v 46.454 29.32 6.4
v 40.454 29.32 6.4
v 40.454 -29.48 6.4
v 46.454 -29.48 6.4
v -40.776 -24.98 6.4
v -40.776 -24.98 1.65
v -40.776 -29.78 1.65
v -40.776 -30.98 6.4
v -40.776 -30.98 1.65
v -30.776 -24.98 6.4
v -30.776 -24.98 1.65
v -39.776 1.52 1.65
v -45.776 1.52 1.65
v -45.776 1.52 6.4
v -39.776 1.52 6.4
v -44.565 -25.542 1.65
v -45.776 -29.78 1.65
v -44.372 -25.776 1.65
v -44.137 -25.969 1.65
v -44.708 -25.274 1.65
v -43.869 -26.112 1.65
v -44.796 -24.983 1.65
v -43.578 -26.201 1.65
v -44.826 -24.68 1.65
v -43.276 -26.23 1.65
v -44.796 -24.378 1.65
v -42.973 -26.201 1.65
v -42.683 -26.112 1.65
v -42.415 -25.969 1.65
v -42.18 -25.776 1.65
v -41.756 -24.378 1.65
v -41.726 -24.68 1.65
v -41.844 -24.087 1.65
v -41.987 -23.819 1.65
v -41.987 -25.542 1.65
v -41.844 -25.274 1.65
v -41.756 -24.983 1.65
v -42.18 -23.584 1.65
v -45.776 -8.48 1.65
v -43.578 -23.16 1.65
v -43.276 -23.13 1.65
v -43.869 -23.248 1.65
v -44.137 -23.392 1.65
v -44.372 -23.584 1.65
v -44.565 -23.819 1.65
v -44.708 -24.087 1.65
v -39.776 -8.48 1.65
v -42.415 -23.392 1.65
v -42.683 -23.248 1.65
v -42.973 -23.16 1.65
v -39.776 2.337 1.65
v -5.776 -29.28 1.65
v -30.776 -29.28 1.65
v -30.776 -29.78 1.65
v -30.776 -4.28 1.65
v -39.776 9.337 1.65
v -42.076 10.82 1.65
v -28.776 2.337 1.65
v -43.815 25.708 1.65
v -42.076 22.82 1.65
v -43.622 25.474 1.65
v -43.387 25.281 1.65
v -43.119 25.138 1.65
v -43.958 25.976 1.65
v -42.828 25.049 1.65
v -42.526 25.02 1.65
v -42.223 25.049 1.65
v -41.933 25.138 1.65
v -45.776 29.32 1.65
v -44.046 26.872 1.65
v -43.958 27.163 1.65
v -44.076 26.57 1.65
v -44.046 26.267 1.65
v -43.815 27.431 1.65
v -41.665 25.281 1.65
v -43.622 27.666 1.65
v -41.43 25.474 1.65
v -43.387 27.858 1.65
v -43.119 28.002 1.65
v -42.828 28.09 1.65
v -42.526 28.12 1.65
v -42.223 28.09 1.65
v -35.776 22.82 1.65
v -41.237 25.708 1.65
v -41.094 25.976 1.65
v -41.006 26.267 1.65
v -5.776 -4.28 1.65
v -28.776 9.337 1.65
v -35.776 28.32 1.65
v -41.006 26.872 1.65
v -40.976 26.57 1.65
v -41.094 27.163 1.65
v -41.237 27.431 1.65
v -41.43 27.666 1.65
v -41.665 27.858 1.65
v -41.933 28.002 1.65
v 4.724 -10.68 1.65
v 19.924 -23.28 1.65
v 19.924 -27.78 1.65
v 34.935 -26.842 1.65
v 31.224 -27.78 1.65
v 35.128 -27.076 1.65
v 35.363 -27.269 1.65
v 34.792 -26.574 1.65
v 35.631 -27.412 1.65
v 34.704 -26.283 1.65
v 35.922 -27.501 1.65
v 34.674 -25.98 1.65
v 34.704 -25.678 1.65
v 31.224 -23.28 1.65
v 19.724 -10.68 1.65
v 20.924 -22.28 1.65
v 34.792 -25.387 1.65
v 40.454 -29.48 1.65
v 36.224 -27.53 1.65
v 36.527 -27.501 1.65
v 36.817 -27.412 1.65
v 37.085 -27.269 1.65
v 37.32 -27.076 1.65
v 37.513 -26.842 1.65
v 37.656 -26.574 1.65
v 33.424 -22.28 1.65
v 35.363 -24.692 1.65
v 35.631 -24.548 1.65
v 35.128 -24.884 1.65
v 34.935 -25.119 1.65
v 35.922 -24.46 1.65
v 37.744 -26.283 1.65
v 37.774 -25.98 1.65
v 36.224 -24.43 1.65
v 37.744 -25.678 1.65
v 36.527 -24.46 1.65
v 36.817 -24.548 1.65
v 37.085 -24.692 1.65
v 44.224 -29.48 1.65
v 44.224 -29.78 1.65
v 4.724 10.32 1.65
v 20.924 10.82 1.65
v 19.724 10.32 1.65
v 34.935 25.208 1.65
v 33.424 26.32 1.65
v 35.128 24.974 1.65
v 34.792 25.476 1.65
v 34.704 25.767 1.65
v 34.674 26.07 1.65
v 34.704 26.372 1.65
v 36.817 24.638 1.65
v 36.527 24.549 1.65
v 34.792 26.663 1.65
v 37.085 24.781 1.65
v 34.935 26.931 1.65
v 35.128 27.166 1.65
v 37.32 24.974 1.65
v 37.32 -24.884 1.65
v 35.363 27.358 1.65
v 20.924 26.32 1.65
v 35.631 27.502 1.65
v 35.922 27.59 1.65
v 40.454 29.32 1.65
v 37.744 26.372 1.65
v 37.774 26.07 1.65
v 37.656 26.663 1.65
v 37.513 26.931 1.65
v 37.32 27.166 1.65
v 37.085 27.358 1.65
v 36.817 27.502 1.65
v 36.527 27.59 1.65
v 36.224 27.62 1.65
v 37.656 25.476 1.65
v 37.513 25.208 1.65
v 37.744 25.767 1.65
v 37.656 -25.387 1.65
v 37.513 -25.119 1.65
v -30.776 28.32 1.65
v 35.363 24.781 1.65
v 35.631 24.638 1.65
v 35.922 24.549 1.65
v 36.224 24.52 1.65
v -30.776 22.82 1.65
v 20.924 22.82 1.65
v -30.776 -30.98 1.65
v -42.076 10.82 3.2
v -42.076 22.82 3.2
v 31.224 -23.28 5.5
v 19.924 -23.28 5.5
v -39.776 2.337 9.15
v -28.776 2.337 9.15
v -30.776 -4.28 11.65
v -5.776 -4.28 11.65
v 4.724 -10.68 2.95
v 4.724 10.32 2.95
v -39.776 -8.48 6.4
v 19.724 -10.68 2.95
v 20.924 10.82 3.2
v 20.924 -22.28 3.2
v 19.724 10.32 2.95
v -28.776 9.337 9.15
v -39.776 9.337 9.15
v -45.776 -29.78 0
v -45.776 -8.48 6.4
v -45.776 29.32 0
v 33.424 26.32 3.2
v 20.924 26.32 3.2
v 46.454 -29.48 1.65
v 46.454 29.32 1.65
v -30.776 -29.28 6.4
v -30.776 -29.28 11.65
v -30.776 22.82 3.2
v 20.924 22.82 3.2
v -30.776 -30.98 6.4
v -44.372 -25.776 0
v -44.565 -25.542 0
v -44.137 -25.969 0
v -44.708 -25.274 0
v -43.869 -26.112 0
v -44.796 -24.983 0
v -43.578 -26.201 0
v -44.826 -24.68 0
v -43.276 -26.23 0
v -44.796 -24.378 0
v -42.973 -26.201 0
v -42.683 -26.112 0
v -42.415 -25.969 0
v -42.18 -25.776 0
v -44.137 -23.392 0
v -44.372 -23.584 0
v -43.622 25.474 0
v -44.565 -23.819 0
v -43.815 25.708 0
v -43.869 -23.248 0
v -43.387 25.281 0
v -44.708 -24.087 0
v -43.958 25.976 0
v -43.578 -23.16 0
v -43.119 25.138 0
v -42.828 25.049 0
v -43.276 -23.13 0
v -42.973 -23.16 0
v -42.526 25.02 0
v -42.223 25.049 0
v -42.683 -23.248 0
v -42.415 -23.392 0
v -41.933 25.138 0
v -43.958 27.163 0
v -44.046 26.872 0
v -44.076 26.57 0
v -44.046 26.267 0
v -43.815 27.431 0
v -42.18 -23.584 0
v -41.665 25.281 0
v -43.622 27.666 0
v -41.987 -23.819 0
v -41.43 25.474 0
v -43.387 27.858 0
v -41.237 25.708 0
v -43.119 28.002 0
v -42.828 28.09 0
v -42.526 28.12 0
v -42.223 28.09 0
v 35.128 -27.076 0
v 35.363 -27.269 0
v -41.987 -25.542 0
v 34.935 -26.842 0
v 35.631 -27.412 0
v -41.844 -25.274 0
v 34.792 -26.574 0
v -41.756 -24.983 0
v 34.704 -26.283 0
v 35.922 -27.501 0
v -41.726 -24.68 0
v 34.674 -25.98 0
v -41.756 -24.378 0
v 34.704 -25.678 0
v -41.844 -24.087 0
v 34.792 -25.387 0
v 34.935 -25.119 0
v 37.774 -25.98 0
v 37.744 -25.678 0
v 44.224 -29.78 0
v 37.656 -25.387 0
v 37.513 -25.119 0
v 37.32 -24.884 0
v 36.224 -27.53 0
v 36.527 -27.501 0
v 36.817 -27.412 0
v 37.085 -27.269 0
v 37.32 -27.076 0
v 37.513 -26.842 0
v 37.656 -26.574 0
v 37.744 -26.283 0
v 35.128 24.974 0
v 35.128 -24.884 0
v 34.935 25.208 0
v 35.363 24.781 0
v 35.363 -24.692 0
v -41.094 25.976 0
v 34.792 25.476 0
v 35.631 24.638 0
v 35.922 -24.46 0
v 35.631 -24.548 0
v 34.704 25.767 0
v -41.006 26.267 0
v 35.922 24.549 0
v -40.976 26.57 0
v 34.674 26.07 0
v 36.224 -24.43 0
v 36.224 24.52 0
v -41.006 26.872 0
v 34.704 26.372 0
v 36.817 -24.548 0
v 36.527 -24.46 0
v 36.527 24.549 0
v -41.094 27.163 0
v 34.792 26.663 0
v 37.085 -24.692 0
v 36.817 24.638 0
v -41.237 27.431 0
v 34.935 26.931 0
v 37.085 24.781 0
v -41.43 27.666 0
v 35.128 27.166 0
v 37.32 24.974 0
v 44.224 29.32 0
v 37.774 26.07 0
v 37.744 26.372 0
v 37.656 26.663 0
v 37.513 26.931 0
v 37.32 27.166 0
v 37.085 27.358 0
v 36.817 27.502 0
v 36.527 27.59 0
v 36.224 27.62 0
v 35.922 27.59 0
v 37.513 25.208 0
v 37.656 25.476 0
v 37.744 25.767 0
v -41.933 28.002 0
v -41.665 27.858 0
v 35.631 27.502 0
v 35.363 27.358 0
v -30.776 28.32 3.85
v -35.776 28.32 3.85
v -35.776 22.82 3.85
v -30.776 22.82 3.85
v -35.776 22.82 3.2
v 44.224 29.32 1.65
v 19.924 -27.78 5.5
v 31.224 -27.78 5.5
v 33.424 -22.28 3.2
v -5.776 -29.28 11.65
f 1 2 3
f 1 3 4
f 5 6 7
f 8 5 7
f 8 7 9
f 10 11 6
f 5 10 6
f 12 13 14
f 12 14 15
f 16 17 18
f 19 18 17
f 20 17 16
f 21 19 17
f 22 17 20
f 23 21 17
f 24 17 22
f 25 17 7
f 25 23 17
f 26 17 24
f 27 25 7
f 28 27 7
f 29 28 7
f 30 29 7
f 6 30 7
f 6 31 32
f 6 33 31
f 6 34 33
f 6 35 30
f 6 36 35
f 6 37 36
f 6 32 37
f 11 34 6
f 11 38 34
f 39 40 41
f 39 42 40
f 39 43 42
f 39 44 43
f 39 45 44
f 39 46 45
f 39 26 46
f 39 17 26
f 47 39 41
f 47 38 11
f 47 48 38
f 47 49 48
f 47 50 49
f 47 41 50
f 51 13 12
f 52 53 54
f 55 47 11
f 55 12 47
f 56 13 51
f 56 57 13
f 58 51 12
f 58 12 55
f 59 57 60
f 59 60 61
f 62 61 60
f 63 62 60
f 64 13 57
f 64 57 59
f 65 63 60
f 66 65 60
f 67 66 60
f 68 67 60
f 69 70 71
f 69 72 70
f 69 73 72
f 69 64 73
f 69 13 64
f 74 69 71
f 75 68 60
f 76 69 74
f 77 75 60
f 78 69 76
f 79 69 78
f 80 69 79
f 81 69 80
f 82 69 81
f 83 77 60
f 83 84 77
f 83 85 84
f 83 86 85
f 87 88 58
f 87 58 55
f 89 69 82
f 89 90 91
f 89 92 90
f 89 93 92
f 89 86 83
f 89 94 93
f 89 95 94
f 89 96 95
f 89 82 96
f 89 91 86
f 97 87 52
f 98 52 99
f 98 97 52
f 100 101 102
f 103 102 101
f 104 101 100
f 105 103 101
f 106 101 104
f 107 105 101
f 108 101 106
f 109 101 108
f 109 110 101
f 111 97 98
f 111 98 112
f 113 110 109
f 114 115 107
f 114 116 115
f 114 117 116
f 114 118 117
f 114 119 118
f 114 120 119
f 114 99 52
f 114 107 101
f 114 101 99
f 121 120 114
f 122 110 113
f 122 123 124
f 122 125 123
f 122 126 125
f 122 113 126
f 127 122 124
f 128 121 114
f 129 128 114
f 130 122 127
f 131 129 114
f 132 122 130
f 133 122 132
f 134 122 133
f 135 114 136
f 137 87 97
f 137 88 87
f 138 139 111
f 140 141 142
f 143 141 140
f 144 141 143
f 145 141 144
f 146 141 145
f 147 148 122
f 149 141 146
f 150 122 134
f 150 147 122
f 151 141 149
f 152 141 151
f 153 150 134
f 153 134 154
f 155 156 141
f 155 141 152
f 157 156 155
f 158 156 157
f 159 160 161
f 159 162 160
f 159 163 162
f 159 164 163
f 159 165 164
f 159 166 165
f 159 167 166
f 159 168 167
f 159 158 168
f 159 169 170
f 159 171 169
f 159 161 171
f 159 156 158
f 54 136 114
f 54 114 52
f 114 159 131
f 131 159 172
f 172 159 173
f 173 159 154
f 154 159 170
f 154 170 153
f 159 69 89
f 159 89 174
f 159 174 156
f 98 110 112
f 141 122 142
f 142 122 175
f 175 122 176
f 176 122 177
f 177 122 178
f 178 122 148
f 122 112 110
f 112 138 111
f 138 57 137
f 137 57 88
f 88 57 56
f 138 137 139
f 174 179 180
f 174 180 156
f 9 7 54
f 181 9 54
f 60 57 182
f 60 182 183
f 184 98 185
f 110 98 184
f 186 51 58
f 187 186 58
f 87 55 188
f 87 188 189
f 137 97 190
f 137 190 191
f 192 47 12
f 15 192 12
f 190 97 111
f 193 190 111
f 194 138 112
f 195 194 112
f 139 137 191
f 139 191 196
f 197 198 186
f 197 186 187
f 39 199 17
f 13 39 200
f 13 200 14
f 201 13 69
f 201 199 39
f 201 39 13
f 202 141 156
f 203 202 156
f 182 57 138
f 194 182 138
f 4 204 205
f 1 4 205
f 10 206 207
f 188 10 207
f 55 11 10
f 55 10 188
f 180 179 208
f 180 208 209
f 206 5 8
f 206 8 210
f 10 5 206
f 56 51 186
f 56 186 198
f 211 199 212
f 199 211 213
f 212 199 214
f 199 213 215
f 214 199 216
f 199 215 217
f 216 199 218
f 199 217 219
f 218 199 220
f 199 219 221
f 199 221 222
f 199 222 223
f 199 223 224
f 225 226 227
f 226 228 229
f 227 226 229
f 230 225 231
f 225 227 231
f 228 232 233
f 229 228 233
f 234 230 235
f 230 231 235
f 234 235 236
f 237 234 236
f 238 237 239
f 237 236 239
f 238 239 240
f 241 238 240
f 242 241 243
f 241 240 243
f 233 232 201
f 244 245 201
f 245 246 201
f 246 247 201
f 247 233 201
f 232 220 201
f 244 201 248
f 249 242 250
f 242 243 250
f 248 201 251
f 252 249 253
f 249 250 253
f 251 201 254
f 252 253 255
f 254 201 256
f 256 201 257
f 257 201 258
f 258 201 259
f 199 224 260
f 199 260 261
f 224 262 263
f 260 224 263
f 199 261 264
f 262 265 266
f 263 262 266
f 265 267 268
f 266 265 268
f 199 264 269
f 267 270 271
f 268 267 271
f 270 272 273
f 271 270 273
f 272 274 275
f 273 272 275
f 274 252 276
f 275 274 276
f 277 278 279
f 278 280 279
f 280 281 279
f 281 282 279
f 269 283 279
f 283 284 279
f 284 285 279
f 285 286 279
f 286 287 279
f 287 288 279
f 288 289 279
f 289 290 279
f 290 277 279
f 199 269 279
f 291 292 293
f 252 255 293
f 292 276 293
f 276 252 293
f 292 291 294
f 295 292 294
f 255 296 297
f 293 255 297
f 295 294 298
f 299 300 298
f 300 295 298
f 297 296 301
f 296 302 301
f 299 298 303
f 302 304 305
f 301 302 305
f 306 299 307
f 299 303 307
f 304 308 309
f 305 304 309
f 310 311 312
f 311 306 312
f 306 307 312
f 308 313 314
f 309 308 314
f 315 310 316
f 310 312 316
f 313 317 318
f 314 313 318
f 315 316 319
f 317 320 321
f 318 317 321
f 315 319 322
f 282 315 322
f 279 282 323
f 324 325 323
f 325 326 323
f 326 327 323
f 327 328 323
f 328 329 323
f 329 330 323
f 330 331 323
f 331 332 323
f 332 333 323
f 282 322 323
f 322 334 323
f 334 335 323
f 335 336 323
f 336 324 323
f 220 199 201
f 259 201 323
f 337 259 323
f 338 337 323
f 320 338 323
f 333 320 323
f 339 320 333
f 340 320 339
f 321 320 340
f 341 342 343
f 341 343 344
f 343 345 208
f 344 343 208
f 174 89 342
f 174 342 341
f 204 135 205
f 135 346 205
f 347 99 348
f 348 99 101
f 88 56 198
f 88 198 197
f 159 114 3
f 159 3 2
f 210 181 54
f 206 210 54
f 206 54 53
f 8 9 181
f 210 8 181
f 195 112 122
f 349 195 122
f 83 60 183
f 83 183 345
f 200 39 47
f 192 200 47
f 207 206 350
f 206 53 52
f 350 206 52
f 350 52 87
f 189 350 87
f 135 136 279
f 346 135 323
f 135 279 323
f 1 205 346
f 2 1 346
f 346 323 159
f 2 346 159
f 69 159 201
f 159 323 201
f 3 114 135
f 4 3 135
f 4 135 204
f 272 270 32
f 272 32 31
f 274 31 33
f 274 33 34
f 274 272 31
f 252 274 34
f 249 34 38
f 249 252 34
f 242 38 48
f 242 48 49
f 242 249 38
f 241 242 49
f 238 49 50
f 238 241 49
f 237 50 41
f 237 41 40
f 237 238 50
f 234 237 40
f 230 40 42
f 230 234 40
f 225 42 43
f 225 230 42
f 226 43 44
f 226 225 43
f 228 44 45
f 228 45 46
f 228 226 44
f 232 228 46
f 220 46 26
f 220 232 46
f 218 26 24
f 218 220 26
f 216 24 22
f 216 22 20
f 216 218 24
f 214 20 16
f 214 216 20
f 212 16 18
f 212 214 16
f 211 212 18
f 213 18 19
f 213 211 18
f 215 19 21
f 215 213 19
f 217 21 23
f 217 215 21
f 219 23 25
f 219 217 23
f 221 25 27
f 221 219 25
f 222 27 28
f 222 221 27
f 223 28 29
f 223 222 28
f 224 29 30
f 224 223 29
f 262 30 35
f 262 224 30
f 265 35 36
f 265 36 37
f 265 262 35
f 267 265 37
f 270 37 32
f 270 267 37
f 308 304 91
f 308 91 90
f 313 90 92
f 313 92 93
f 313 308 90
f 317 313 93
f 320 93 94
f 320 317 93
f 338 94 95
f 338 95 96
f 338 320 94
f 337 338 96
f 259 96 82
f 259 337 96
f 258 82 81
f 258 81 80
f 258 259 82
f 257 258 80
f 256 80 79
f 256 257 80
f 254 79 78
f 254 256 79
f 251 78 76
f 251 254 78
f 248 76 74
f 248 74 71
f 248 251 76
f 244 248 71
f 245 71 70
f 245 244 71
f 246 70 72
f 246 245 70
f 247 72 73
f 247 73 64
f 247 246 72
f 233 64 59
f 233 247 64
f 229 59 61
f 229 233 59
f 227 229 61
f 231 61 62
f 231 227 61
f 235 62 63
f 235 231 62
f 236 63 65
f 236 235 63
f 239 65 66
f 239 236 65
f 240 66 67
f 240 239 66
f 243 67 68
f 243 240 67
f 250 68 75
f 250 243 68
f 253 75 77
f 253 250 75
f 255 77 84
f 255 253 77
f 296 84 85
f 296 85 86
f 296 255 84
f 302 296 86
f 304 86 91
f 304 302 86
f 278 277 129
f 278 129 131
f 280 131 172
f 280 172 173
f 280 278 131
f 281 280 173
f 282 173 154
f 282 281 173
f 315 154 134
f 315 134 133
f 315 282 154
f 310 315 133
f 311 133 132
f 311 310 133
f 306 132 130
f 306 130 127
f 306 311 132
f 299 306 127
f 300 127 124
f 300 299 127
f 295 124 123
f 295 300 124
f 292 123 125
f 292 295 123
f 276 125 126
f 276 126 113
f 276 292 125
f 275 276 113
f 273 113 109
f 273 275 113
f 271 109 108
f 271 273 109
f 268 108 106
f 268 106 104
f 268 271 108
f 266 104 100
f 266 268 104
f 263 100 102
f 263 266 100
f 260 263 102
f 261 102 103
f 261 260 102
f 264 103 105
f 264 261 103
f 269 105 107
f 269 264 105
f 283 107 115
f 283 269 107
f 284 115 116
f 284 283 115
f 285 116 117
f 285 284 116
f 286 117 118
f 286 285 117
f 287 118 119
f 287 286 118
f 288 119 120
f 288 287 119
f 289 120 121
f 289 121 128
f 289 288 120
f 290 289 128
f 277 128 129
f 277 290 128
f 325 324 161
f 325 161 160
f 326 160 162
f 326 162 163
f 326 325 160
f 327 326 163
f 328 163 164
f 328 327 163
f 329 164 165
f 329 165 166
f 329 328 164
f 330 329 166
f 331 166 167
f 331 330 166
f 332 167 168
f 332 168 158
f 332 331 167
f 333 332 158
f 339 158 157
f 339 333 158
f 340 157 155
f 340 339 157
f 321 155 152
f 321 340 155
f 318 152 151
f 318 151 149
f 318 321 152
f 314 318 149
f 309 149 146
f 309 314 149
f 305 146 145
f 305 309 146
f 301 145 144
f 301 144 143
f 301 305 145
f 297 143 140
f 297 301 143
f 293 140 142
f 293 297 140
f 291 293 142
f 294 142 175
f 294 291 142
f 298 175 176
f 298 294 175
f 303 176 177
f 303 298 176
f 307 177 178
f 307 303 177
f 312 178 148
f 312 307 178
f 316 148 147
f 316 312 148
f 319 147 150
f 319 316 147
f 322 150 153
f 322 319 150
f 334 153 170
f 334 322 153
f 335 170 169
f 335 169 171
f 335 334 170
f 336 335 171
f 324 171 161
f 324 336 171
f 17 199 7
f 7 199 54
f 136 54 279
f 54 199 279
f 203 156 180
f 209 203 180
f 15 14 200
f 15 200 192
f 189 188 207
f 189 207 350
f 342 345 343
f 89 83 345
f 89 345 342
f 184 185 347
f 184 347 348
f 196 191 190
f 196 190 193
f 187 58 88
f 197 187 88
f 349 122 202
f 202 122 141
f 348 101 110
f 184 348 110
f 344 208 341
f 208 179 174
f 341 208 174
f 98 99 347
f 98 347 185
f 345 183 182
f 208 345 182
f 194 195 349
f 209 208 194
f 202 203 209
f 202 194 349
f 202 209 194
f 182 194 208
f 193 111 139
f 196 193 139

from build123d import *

# Parameters (mm, degrees)
F0_W      = 90
F0_H      = 59.1
F0_R      = 1.55
F1_DEPTH  = 1.65
F2_W      = 63
F2_H      = 12
F3_DEPTH  = 3.2
F4_W      = 5
F4_H      = 5.5
F5_DEPTH  = 2.2
F6_W      = 2.23
F6_H      = 58.8
F6_W_2    = 3.77
F7_DEPTH  = 4.75
F8_W      = 15
F8_H      = 21
F9_DEPTH  = 1.3
F10_W     = 11.3
F10_H     = 4.5
F11_DEPTH = 3.85
F12_W     = 11
F12_H     = 7
F13_DEPTH = 7.5
F14_W     = 25
F14_H     = 25
F15_DEPTH = 10
F16_W     = 6
F16_H     = 10
F16_W_2   = 10
F16_H_2   = 1.2
F17_DEPTH = 4.75


with BuildPart() as f1:
    # F0 (on Top) → F1 (new body)
    with BuildSketch(Plane.XY):
        with Locations((-0.775745, -0.230454)):
            Rectangle(F0_W, F0_H)
        with Locations((-43.275745, -24.680454)):
            Circle(F0_R, mode=Mode.SUBTRACT)
        with Locations((36.224255, -25.980454)):
            Circle(F0_R, mode=Mode.SUBTRACT)
        with Locations((-42.525745, 26.569546)):
            Circle(F0_R, mode=Mode.SUBTRACT)
        with Locations((36.224255, 26.069546)):
            Circle(F0_R, mode=Mode.SUBTRACT)
    extrude(amount=F1_DEPTH)

    # F2 (on Top) → F3 (join)
    with BuildSketch(Plane.XY):
        Polygon((20.924255, -22.280454), (33.424255, -22.280454), (33.424255, 26.319546), (20.924255, 26.319546), (20.924255, 22.819546), (20.924255, 10.819546), align=None)
        with Locations((-10.575745, 16.819546)):
            Rectangle(F2_W, F2_H)
    extrude(amount=F3_DEPTH)

    # F4 (on face) → F5 (join)
    with BuildSketch(Plane.XY.offset(1.65)):
        with Locations((-33.275745, 25.569546)):
            Rectangle(F4_W, F4_H)
    extrude(amount=F5_DEPTH)

    # F6 (on face) → F7 (join)
    with BuildSketch(Plane.XY.offset(1.65)):
        with Locations((45.339255, -0.080454)):
            Rectangle(F6_W, F6_H)
        with Locations((42.339255, -0.080454)):
            Rectangle(F6_W_2, F6_H)
    extrude(amount=F7_DEPTH)

    # F8 (on face) → F9 (join)
    with BuildSketch(Plane.XY.offset(1.65)):
        with Locations((12.224255, -0.180454)):
            Rectangle(F8_W, F8_H)
    extrude(amount=F9_DEPTH)

    # F10 (on face) → F11 (join)
    with BuildSketch(Plane.XY.offset(1.65)):
        with Locations((25.574255, -25.530454)):
            Rectangle(F10_W, F10_H)
    extrude(amount=F11_DEPTH)

    # F12 (on face) → F13 (join)
    with BuildSketch(Plane.XY.offset(1.65)):
        with Locations((-34.275745, 5.836562)):
            Rectangle(F12_W, F12_H)
    extrude(amount=F13_DEPTH)

    # F14 (on face) → F15 (join)
    with BuildSketch(Plane.XY.offset(1.65)):
        with Locations((-18.275745, -16.780454)):
            Rectangle(F14_W, F14_H)
    extrude(amount=F15_DEPTH)

    # F16 (on face) → F17 (join)
    with BuildSketch(Plane.XY.offset(1.65)):
        with Locations((-42.775745, -3.480454)):
            Rectangle(F16_W, F16_H)
        Polygon((-40.775745, -24.980454), (-40.775745, -29.780454), (-30.775745, -29.780454), (-30.775745, -29.280454), (-30.775745, -24.980454), align=None)
        with Locations((-35.775745, -30.380454)):
            Rectangle(F16_W_2, F16_H_2)
    extrude(amount=F17_DEPTH)


solid = f1.part
